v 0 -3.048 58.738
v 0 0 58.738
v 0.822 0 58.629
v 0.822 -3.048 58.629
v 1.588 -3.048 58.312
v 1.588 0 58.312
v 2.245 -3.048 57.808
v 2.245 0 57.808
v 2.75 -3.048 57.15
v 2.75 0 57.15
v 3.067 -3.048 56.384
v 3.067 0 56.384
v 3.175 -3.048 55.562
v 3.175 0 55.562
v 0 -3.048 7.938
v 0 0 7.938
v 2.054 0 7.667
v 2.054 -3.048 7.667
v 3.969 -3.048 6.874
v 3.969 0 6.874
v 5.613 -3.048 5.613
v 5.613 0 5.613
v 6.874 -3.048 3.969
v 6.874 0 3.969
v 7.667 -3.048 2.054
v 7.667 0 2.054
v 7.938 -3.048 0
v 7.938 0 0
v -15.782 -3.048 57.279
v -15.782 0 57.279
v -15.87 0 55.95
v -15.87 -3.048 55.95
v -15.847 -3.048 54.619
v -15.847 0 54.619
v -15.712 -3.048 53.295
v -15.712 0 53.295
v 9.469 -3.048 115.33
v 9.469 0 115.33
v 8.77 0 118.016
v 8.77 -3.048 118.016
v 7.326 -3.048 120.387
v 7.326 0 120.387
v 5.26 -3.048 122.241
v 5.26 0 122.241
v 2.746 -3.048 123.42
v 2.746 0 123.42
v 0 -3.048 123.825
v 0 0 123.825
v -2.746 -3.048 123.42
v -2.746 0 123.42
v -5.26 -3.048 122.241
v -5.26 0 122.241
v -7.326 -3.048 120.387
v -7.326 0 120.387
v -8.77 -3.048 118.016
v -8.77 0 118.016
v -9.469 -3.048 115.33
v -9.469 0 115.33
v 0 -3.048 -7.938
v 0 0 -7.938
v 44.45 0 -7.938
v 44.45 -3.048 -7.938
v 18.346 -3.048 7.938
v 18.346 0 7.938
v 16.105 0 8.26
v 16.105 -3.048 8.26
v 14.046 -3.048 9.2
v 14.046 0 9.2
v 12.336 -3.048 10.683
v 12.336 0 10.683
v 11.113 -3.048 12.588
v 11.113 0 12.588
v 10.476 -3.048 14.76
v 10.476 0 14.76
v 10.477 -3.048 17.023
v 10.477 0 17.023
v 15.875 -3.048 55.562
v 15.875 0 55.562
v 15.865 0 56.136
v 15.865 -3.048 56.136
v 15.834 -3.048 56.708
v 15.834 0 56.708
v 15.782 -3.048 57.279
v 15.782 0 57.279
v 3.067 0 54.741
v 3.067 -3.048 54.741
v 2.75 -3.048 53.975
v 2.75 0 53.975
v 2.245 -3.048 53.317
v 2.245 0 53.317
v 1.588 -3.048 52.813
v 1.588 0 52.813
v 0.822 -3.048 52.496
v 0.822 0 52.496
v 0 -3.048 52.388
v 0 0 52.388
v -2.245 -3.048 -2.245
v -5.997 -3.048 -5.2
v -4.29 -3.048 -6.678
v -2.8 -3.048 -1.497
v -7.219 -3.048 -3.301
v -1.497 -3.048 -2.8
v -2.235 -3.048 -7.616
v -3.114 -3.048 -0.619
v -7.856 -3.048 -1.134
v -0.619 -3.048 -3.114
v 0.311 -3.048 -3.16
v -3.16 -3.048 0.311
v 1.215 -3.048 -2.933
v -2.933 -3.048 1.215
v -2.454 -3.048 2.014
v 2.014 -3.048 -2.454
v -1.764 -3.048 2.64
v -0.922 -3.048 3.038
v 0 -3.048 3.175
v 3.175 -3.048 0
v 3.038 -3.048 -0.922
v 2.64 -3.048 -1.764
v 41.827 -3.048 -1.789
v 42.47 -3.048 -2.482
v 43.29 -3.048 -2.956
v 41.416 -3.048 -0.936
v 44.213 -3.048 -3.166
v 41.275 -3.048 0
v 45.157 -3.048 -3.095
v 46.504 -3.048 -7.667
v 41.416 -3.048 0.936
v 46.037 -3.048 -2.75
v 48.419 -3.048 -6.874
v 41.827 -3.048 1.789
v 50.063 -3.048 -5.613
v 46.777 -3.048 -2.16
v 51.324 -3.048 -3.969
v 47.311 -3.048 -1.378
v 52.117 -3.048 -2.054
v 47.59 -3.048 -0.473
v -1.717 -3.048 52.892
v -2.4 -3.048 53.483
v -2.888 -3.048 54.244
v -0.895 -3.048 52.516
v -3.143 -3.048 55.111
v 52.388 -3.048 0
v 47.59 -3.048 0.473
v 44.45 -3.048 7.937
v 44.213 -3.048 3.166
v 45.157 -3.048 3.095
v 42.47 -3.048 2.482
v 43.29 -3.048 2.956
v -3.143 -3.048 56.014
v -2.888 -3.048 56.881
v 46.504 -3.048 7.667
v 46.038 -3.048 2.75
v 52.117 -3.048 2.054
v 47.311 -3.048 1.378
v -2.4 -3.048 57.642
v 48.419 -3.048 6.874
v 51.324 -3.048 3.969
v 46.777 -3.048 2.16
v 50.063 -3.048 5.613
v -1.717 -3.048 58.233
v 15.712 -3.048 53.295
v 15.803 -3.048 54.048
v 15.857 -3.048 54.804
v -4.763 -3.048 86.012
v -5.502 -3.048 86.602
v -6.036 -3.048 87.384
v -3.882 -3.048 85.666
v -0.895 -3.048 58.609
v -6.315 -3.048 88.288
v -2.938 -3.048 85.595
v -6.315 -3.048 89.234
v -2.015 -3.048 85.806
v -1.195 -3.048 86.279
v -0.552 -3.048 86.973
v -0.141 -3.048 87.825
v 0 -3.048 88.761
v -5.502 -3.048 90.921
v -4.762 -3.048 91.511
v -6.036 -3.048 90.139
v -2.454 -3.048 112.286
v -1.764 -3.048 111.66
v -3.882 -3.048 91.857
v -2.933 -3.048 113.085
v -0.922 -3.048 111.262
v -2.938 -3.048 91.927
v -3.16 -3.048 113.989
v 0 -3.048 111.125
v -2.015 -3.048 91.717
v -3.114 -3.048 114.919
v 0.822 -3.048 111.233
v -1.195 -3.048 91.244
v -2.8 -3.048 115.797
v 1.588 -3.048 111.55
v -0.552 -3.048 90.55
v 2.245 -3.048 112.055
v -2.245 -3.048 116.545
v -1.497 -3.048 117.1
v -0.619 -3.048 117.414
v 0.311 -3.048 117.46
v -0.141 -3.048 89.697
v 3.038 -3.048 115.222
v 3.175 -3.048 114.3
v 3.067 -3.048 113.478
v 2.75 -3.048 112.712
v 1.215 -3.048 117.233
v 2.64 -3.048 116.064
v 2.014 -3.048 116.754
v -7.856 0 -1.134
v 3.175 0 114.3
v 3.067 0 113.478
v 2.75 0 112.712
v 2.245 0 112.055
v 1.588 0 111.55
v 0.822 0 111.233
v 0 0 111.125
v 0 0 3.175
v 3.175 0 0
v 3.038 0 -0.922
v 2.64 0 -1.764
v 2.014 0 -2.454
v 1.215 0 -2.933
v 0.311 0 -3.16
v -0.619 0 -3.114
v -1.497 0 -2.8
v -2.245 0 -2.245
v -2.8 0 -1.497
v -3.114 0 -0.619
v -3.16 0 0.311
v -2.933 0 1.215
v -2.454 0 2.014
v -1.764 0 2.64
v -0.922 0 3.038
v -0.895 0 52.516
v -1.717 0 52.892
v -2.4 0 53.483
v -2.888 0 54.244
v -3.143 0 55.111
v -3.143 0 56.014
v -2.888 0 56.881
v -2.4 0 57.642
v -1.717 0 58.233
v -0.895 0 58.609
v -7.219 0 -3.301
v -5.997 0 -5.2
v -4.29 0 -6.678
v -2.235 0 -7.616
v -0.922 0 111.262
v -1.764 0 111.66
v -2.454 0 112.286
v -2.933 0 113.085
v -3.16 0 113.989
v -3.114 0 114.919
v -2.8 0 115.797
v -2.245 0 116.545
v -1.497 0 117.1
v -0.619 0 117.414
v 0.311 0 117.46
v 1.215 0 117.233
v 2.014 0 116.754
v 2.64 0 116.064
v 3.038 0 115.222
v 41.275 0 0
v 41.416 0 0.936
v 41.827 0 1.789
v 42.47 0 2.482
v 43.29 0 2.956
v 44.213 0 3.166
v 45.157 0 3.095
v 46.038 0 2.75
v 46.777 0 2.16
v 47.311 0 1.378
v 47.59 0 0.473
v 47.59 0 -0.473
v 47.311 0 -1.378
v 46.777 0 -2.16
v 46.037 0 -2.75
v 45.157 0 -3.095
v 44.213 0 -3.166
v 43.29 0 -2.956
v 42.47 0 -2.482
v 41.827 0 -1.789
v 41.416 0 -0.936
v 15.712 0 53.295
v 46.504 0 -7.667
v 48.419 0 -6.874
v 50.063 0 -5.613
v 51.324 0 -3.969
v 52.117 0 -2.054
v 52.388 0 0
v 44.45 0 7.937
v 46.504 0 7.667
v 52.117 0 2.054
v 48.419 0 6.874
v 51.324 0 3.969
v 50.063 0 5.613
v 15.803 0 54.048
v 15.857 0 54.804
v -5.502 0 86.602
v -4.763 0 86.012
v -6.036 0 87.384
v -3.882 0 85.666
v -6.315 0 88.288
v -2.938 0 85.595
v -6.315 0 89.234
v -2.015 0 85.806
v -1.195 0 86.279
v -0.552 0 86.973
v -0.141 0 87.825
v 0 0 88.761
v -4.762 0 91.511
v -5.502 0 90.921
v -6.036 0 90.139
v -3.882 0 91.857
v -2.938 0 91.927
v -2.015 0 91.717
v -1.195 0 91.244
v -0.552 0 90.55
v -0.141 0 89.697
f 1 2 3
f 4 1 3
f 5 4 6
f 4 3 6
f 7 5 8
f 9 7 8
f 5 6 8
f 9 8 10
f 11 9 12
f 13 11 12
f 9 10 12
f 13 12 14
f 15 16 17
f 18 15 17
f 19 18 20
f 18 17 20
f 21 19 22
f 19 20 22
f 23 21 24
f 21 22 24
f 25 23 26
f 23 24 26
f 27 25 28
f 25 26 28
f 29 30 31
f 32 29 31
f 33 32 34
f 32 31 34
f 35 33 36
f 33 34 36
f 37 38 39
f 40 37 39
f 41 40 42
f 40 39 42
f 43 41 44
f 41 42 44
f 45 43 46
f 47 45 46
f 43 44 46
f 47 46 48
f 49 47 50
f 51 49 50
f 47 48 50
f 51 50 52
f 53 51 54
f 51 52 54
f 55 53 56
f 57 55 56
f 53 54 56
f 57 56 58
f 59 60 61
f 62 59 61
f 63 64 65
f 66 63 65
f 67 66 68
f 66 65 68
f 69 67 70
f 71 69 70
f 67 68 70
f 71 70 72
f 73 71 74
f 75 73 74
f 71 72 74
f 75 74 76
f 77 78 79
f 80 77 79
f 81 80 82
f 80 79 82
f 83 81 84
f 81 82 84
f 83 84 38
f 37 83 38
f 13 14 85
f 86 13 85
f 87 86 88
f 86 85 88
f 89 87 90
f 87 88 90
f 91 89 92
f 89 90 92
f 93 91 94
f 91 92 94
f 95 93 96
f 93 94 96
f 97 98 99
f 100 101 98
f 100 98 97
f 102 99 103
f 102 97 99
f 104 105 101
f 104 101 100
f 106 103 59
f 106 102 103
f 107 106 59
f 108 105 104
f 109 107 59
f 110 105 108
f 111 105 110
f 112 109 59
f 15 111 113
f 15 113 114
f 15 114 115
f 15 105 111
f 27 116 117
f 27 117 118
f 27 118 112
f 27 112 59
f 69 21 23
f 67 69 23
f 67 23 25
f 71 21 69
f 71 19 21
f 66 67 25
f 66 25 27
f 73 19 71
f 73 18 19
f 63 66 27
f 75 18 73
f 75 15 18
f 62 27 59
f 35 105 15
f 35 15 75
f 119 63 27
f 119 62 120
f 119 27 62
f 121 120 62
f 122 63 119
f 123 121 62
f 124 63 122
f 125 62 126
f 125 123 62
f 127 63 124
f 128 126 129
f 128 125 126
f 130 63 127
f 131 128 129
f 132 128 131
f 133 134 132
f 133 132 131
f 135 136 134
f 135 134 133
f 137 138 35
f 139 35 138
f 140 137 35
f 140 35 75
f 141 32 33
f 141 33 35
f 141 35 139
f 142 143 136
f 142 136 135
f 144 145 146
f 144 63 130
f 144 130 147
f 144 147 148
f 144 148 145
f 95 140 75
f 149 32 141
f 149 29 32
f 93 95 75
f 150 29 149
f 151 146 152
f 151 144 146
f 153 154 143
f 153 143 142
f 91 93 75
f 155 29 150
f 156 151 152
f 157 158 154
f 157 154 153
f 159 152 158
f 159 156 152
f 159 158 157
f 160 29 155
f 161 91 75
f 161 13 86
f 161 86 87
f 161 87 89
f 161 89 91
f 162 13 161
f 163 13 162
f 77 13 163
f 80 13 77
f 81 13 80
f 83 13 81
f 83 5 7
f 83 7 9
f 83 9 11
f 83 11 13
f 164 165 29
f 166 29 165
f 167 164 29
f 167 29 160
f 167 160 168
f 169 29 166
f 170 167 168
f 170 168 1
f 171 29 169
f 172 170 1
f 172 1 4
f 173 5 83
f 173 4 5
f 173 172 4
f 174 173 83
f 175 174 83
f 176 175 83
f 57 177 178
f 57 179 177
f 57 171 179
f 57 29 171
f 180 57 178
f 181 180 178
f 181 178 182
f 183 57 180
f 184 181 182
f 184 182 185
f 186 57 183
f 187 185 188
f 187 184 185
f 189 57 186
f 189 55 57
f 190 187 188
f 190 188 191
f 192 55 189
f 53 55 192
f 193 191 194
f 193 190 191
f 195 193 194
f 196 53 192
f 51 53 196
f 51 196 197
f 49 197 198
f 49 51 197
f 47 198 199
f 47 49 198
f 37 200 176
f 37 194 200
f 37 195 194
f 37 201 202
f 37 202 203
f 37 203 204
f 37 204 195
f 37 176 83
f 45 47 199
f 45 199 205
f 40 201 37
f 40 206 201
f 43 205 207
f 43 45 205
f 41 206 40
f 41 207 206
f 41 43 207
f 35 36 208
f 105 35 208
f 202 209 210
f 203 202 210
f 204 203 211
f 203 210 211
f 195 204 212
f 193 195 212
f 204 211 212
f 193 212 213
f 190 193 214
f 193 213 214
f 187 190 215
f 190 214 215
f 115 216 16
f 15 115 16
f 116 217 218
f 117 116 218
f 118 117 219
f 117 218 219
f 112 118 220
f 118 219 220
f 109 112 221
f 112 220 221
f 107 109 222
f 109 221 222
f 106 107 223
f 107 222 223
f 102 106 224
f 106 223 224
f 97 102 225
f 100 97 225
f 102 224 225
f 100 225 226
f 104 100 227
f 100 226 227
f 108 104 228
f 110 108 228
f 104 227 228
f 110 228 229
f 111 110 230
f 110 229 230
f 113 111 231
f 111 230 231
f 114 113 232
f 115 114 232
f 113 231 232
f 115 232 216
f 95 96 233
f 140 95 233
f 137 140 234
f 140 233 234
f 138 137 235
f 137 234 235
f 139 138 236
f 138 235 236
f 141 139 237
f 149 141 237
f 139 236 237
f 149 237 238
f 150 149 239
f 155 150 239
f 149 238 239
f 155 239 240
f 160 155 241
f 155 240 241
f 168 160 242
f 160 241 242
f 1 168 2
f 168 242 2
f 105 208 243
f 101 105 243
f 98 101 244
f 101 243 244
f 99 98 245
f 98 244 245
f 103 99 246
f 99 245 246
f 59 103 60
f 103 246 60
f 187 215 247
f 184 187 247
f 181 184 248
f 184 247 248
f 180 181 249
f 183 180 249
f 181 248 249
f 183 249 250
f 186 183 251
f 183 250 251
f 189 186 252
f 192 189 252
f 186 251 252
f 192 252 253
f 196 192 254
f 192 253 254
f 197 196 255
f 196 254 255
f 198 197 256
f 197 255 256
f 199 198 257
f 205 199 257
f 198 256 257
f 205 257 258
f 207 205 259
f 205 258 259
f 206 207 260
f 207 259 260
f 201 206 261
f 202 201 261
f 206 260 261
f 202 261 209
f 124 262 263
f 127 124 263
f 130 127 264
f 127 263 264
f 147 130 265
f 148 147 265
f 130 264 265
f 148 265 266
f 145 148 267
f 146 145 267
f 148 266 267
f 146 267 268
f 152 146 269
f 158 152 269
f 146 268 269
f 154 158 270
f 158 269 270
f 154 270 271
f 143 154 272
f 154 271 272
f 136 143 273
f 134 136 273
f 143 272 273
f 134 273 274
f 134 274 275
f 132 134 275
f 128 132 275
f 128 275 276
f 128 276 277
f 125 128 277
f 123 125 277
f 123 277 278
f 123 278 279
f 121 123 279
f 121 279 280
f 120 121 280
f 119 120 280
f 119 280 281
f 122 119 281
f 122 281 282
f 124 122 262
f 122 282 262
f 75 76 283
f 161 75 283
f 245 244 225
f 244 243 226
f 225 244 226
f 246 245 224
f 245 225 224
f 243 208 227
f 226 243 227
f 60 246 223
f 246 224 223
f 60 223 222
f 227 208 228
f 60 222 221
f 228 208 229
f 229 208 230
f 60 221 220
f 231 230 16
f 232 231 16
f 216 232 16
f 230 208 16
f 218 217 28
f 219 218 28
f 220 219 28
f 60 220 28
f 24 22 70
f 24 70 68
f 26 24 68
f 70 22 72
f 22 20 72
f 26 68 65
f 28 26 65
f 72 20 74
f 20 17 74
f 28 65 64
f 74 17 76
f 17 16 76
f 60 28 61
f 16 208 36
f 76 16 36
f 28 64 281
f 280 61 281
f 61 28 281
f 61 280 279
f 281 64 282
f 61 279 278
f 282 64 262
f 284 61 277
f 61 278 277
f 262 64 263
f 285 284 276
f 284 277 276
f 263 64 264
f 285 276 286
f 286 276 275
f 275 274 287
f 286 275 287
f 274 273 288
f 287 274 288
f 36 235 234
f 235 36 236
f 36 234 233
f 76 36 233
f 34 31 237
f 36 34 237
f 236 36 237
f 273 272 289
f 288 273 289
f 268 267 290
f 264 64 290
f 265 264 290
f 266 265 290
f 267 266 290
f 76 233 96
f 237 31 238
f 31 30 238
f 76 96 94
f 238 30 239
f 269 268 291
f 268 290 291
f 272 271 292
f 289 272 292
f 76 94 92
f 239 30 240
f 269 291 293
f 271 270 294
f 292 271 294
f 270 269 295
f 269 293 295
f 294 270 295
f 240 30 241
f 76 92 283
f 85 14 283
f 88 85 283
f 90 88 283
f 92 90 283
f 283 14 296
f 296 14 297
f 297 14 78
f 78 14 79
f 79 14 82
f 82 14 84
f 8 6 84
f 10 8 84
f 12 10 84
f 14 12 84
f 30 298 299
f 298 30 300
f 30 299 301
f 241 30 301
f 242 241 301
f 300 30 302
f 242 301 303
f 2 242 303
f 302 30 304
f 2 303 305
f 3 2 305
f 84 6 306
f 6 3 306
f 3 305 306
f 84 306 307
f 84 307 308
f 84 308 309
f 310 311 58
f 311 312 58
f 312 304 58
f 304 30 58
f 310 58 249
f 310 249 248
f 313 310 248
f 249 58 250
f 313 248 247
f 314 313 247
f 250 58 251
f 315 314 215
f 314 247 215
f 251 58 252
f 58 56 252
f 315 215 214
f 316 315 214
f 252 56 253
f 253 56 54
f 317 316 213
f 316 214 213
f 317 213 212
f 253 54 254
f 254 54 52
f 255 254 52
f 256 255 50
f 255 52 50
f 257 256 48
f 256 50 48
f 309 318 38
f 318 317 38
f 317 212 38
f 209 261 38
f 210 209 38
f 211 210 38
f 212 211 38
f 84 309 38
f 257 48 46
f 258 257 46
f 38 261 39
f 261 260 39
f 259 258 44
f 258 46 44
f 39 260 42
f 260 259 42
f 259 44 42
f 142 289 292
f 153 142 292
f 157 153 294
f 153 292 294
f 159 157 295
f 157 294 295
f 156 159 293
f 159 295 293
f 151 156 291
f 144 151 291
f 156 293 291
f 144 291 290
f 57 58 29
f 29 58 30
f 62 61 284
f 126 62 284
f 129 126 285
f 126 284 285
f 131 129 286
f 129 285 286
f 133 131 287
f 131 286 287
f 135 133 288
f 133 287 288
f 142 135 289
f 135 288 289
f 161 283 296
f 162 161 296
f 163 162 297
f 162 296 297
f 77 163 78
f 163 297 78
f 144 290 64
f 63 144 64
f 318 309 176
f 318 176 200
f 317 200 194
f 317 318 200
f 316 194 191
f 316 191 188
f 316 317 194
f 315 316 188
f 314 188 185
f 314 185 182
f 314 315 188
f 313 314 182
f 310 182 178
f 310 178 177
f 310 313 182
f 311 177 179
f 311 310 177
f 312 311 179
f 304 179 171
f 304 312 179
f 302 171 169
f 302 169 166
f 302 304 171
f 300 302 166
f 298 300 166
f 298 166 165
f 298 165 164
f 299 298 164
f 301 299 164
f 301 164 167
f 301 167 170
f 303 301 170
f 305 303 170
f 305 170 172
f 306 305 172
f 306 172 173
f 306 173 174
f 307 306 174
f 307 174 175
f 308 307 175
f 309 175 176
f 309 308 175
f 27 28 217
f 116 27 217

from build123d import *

# Parameters (mm, degrees)
F0_R     = 3.175
F1_DEPTH = 3.048


with BuildPart() as f1:
    # F0 (on Front) → F1 (new body)
    with BuildSketch(Plane.XZ):
        with BuildLine():
            ThreePointArc((3.175, 0), (-2.2450640303, -2.2450640303), (0, 3.175))
            Line((0, 3.175), (0, 7.9375))
            ThreePointArc((0, 7.9375), (-6.000186009, 5.1963135112), (-7.8560875915, -1.1339285714))
            ThreePointArc((-7.8560875915, -1.1339285714), (-5.1963135112, -6.000186009), (0, -7.9375))
            ThreePointArc((0, -7.9375), (5.6126600757, -5.6126600757), (7.9375, 0))
            Line((7.9375, 0), (3.175, 0))
        make_face()
        with BuildLine():
            ThreePointArc((-7.8560875915, -1.1339285714), (-6.000186009, 5.1963135112), (0, 7.9375))
            Line((0, 7.9375), (0, 39.6875))
            ThreePointArc((0, 39.6875), (-10.3926270225, 43.562127982), (-15.7121751829, 53.2946428571))
            Line((-15.7121751829, 53.2946428571), (-7.8560875915, -1.1339285714))
        make_face()
        with BuildLine():
            Line((0, 39.6875), (0, 7.9375))
            ThreePointArc((0, 7.9375), (5.6126600757, 5.6126600757), (7.9375, 0))
            Line((7.9375, 0), (36.5125, 0))
            ThreePointArc((36.5125, 0), (38.8373399243, 5.6126600757), (44.45, 7.9375))
            Line((44.45, 7.9375), (18.3455357436, 7.9375))
            ThreePointArc((18.3455357436, 7.9375), (12.335749437, 10.6830723871), (10.476878412, 17.0234428571))
            Line((10.476878412, 17.0234428571), (15.7121751829, 53.2946428571))
            ThreePointArc((15.7121751829, 53.2946428571), (10.3926270225, 43.562127982), (0, 39.6875))
        make_face()
        with BuildLine():
            Line((36.5125, 0), (7.9375, 0))
            ThreePointArc((7.9375, 0), (5.6126600757, -5.6126600757), (0, -7.9375))
            Line((0, -7.9375), (44.45, -7.9375))
            ThreePointArc((44.45, -7.9375), (38.8373399243, -5.6126600757), (36.5125, 0))
        make_face()
        with BuildLine():
            ThreePointArc((-15.7121751829, 53.2946428571), (-10.3926270225, 43.562127982), (0, 39.6875))
            Line((0, 39.6875), (0, 52.3875))
            ThreePointArc((0, 52.3875), (-3.175, 55.5625), (0, 58.7375))
            Line((0, 58.7375), (0, 71.4375))
            ThreePointArc((0, 71.4375), (-10.6011956271, 67.3790255586), (-15.7819589391, 57.2787159089))
            ThreePointArc((-15.7819589391, 57.2787159089), (-15.8725653423, 55.284481195), (-15.7121751829, 53.2946428571))
        make_face()
        with BuildLine():
            Line((0, 52.3875), (0, 39.6875))
            ThreePointArc((0, 39.6875), (10.3926270225, 43.562127982), (15.7121751829, 53.2946428571))
            ThreePointArc((15.7121751829, 53.2946428571), (15.8342414727, 54.4256526112), (15.875, 55.5625))
            ThreePointArc((15.875, 55.5625), (15.8517226608, 56.4218681903), (15.7819589056, 57.2787162162))
            ThreePointArc((15.7819589056, 57.2787162162), (10.601195512, 67.3790256618), (0, 71.4375))
            Line((0, 71.4375), (0, 58.7375))
            ThreePointArc((0, 58.7375), (2.2450640303, 57.8075640303), (3.175, 55.5625))
            ThreePointArc((3.175, 55.5625), (2.2450640303, 53.3174359697), (0, 52.3875))
        make_face()
        with BuildLine():
            ThreePointArc((44.45, 7.9375), (38.8373399243, 5.6126600757), (36.5125, 0))
            ThreePointArc((36.5125, 0), (38.8373399243, -5.6126600757), (44.45, -7.9375))
            ThreePointArc((44.45, -7.9375), (50.0626600757, -5.6126600757), (52.3875, 0))
            ThreePointArc((52.3875, 0), (50.0626600757, 5.6126600757), (44.45, 7.9375))
        make_face()
        with BuildLine():
            ThreePointArc((47.625, 0), (44.45, -3.175), (41.275, 0))
            ThreePointArc((41.275, 0), (44.45, 3.175), (47.625, 0))
        make_face(mode=Mode.SUBTRACT)
        with BuildLine():
            Line((-9.4691753434, 115.3297297297), (-15.7819589391, 57.2787159089))
            ThreePointArc((-15.7819589391, 57.2787159089), (-10.6011956271, 67.3790255586), (0, 71.4375))
            Line((0, 71.4375), (0, 88.7612230935))
            Line((0, 88.7612230935), (0, 104.775))
            ThreePointArc((0, 104.775), (-7.0899153971, 107.9392826928), (-9.4691753434, 115.3297297297))
        make_face()
        with Locations((-3.175, 88.7612230935)):
            Circle(F0_R, mode=Mode.SUBTRACT)
        with BuildLine():
            Line((0, 88.7612230935), (0, 71.4375))
            ThreePointArc((0, 71.4375), (10.601195512, 67.3790256618), (15.7819589056, 57.2787162162))
            Line((15.7819589056, 57.2787162162), (9.4691753434, 115.3297297297))
            ThreePointArc((9.4691753434, 115.3297297297), (9.5110335965, 114.8156209142), (9.525, 114.3))
            ThreePointArc((9.525, 114.3), (6.7351920908, 107.5648079092), (0, 104.775))
            Line((0, 104.775), (0, 88.7612230935))
        make_face()
        with BuildLine():
            ThreePointArc((9.4691753434, 115.3297297297), (0, 123.825), (-9.4691753434, 115.3297297297))
            ThreePointArc((-9.4691753434, 115.3297297297), (-7.0899153971, 107.9392826928), (0, 104.775))
            ThreePointArc((0, 104.775), (6.7351920908, 107.5648079092), (9.525, 114.3))
            ThreePointArc((9.525, 114.3), (9.5110335965, 114.8156209142), (9.4691753434, 115.3297297297))
        make_face()
        with BuildLine():
            ThreePointArc((3.175, 114.3), (2.2450640303, 112.0549359697), (0, 111.125))
            ThreePointArc((0, 111.125), (-2.2450640303, 116.5450640303), (3.175, 114.3))
        make_face(mode=Mode.SUBTRACT)
    extrude(amount=F1_DEPTH)


solid = f1.part
